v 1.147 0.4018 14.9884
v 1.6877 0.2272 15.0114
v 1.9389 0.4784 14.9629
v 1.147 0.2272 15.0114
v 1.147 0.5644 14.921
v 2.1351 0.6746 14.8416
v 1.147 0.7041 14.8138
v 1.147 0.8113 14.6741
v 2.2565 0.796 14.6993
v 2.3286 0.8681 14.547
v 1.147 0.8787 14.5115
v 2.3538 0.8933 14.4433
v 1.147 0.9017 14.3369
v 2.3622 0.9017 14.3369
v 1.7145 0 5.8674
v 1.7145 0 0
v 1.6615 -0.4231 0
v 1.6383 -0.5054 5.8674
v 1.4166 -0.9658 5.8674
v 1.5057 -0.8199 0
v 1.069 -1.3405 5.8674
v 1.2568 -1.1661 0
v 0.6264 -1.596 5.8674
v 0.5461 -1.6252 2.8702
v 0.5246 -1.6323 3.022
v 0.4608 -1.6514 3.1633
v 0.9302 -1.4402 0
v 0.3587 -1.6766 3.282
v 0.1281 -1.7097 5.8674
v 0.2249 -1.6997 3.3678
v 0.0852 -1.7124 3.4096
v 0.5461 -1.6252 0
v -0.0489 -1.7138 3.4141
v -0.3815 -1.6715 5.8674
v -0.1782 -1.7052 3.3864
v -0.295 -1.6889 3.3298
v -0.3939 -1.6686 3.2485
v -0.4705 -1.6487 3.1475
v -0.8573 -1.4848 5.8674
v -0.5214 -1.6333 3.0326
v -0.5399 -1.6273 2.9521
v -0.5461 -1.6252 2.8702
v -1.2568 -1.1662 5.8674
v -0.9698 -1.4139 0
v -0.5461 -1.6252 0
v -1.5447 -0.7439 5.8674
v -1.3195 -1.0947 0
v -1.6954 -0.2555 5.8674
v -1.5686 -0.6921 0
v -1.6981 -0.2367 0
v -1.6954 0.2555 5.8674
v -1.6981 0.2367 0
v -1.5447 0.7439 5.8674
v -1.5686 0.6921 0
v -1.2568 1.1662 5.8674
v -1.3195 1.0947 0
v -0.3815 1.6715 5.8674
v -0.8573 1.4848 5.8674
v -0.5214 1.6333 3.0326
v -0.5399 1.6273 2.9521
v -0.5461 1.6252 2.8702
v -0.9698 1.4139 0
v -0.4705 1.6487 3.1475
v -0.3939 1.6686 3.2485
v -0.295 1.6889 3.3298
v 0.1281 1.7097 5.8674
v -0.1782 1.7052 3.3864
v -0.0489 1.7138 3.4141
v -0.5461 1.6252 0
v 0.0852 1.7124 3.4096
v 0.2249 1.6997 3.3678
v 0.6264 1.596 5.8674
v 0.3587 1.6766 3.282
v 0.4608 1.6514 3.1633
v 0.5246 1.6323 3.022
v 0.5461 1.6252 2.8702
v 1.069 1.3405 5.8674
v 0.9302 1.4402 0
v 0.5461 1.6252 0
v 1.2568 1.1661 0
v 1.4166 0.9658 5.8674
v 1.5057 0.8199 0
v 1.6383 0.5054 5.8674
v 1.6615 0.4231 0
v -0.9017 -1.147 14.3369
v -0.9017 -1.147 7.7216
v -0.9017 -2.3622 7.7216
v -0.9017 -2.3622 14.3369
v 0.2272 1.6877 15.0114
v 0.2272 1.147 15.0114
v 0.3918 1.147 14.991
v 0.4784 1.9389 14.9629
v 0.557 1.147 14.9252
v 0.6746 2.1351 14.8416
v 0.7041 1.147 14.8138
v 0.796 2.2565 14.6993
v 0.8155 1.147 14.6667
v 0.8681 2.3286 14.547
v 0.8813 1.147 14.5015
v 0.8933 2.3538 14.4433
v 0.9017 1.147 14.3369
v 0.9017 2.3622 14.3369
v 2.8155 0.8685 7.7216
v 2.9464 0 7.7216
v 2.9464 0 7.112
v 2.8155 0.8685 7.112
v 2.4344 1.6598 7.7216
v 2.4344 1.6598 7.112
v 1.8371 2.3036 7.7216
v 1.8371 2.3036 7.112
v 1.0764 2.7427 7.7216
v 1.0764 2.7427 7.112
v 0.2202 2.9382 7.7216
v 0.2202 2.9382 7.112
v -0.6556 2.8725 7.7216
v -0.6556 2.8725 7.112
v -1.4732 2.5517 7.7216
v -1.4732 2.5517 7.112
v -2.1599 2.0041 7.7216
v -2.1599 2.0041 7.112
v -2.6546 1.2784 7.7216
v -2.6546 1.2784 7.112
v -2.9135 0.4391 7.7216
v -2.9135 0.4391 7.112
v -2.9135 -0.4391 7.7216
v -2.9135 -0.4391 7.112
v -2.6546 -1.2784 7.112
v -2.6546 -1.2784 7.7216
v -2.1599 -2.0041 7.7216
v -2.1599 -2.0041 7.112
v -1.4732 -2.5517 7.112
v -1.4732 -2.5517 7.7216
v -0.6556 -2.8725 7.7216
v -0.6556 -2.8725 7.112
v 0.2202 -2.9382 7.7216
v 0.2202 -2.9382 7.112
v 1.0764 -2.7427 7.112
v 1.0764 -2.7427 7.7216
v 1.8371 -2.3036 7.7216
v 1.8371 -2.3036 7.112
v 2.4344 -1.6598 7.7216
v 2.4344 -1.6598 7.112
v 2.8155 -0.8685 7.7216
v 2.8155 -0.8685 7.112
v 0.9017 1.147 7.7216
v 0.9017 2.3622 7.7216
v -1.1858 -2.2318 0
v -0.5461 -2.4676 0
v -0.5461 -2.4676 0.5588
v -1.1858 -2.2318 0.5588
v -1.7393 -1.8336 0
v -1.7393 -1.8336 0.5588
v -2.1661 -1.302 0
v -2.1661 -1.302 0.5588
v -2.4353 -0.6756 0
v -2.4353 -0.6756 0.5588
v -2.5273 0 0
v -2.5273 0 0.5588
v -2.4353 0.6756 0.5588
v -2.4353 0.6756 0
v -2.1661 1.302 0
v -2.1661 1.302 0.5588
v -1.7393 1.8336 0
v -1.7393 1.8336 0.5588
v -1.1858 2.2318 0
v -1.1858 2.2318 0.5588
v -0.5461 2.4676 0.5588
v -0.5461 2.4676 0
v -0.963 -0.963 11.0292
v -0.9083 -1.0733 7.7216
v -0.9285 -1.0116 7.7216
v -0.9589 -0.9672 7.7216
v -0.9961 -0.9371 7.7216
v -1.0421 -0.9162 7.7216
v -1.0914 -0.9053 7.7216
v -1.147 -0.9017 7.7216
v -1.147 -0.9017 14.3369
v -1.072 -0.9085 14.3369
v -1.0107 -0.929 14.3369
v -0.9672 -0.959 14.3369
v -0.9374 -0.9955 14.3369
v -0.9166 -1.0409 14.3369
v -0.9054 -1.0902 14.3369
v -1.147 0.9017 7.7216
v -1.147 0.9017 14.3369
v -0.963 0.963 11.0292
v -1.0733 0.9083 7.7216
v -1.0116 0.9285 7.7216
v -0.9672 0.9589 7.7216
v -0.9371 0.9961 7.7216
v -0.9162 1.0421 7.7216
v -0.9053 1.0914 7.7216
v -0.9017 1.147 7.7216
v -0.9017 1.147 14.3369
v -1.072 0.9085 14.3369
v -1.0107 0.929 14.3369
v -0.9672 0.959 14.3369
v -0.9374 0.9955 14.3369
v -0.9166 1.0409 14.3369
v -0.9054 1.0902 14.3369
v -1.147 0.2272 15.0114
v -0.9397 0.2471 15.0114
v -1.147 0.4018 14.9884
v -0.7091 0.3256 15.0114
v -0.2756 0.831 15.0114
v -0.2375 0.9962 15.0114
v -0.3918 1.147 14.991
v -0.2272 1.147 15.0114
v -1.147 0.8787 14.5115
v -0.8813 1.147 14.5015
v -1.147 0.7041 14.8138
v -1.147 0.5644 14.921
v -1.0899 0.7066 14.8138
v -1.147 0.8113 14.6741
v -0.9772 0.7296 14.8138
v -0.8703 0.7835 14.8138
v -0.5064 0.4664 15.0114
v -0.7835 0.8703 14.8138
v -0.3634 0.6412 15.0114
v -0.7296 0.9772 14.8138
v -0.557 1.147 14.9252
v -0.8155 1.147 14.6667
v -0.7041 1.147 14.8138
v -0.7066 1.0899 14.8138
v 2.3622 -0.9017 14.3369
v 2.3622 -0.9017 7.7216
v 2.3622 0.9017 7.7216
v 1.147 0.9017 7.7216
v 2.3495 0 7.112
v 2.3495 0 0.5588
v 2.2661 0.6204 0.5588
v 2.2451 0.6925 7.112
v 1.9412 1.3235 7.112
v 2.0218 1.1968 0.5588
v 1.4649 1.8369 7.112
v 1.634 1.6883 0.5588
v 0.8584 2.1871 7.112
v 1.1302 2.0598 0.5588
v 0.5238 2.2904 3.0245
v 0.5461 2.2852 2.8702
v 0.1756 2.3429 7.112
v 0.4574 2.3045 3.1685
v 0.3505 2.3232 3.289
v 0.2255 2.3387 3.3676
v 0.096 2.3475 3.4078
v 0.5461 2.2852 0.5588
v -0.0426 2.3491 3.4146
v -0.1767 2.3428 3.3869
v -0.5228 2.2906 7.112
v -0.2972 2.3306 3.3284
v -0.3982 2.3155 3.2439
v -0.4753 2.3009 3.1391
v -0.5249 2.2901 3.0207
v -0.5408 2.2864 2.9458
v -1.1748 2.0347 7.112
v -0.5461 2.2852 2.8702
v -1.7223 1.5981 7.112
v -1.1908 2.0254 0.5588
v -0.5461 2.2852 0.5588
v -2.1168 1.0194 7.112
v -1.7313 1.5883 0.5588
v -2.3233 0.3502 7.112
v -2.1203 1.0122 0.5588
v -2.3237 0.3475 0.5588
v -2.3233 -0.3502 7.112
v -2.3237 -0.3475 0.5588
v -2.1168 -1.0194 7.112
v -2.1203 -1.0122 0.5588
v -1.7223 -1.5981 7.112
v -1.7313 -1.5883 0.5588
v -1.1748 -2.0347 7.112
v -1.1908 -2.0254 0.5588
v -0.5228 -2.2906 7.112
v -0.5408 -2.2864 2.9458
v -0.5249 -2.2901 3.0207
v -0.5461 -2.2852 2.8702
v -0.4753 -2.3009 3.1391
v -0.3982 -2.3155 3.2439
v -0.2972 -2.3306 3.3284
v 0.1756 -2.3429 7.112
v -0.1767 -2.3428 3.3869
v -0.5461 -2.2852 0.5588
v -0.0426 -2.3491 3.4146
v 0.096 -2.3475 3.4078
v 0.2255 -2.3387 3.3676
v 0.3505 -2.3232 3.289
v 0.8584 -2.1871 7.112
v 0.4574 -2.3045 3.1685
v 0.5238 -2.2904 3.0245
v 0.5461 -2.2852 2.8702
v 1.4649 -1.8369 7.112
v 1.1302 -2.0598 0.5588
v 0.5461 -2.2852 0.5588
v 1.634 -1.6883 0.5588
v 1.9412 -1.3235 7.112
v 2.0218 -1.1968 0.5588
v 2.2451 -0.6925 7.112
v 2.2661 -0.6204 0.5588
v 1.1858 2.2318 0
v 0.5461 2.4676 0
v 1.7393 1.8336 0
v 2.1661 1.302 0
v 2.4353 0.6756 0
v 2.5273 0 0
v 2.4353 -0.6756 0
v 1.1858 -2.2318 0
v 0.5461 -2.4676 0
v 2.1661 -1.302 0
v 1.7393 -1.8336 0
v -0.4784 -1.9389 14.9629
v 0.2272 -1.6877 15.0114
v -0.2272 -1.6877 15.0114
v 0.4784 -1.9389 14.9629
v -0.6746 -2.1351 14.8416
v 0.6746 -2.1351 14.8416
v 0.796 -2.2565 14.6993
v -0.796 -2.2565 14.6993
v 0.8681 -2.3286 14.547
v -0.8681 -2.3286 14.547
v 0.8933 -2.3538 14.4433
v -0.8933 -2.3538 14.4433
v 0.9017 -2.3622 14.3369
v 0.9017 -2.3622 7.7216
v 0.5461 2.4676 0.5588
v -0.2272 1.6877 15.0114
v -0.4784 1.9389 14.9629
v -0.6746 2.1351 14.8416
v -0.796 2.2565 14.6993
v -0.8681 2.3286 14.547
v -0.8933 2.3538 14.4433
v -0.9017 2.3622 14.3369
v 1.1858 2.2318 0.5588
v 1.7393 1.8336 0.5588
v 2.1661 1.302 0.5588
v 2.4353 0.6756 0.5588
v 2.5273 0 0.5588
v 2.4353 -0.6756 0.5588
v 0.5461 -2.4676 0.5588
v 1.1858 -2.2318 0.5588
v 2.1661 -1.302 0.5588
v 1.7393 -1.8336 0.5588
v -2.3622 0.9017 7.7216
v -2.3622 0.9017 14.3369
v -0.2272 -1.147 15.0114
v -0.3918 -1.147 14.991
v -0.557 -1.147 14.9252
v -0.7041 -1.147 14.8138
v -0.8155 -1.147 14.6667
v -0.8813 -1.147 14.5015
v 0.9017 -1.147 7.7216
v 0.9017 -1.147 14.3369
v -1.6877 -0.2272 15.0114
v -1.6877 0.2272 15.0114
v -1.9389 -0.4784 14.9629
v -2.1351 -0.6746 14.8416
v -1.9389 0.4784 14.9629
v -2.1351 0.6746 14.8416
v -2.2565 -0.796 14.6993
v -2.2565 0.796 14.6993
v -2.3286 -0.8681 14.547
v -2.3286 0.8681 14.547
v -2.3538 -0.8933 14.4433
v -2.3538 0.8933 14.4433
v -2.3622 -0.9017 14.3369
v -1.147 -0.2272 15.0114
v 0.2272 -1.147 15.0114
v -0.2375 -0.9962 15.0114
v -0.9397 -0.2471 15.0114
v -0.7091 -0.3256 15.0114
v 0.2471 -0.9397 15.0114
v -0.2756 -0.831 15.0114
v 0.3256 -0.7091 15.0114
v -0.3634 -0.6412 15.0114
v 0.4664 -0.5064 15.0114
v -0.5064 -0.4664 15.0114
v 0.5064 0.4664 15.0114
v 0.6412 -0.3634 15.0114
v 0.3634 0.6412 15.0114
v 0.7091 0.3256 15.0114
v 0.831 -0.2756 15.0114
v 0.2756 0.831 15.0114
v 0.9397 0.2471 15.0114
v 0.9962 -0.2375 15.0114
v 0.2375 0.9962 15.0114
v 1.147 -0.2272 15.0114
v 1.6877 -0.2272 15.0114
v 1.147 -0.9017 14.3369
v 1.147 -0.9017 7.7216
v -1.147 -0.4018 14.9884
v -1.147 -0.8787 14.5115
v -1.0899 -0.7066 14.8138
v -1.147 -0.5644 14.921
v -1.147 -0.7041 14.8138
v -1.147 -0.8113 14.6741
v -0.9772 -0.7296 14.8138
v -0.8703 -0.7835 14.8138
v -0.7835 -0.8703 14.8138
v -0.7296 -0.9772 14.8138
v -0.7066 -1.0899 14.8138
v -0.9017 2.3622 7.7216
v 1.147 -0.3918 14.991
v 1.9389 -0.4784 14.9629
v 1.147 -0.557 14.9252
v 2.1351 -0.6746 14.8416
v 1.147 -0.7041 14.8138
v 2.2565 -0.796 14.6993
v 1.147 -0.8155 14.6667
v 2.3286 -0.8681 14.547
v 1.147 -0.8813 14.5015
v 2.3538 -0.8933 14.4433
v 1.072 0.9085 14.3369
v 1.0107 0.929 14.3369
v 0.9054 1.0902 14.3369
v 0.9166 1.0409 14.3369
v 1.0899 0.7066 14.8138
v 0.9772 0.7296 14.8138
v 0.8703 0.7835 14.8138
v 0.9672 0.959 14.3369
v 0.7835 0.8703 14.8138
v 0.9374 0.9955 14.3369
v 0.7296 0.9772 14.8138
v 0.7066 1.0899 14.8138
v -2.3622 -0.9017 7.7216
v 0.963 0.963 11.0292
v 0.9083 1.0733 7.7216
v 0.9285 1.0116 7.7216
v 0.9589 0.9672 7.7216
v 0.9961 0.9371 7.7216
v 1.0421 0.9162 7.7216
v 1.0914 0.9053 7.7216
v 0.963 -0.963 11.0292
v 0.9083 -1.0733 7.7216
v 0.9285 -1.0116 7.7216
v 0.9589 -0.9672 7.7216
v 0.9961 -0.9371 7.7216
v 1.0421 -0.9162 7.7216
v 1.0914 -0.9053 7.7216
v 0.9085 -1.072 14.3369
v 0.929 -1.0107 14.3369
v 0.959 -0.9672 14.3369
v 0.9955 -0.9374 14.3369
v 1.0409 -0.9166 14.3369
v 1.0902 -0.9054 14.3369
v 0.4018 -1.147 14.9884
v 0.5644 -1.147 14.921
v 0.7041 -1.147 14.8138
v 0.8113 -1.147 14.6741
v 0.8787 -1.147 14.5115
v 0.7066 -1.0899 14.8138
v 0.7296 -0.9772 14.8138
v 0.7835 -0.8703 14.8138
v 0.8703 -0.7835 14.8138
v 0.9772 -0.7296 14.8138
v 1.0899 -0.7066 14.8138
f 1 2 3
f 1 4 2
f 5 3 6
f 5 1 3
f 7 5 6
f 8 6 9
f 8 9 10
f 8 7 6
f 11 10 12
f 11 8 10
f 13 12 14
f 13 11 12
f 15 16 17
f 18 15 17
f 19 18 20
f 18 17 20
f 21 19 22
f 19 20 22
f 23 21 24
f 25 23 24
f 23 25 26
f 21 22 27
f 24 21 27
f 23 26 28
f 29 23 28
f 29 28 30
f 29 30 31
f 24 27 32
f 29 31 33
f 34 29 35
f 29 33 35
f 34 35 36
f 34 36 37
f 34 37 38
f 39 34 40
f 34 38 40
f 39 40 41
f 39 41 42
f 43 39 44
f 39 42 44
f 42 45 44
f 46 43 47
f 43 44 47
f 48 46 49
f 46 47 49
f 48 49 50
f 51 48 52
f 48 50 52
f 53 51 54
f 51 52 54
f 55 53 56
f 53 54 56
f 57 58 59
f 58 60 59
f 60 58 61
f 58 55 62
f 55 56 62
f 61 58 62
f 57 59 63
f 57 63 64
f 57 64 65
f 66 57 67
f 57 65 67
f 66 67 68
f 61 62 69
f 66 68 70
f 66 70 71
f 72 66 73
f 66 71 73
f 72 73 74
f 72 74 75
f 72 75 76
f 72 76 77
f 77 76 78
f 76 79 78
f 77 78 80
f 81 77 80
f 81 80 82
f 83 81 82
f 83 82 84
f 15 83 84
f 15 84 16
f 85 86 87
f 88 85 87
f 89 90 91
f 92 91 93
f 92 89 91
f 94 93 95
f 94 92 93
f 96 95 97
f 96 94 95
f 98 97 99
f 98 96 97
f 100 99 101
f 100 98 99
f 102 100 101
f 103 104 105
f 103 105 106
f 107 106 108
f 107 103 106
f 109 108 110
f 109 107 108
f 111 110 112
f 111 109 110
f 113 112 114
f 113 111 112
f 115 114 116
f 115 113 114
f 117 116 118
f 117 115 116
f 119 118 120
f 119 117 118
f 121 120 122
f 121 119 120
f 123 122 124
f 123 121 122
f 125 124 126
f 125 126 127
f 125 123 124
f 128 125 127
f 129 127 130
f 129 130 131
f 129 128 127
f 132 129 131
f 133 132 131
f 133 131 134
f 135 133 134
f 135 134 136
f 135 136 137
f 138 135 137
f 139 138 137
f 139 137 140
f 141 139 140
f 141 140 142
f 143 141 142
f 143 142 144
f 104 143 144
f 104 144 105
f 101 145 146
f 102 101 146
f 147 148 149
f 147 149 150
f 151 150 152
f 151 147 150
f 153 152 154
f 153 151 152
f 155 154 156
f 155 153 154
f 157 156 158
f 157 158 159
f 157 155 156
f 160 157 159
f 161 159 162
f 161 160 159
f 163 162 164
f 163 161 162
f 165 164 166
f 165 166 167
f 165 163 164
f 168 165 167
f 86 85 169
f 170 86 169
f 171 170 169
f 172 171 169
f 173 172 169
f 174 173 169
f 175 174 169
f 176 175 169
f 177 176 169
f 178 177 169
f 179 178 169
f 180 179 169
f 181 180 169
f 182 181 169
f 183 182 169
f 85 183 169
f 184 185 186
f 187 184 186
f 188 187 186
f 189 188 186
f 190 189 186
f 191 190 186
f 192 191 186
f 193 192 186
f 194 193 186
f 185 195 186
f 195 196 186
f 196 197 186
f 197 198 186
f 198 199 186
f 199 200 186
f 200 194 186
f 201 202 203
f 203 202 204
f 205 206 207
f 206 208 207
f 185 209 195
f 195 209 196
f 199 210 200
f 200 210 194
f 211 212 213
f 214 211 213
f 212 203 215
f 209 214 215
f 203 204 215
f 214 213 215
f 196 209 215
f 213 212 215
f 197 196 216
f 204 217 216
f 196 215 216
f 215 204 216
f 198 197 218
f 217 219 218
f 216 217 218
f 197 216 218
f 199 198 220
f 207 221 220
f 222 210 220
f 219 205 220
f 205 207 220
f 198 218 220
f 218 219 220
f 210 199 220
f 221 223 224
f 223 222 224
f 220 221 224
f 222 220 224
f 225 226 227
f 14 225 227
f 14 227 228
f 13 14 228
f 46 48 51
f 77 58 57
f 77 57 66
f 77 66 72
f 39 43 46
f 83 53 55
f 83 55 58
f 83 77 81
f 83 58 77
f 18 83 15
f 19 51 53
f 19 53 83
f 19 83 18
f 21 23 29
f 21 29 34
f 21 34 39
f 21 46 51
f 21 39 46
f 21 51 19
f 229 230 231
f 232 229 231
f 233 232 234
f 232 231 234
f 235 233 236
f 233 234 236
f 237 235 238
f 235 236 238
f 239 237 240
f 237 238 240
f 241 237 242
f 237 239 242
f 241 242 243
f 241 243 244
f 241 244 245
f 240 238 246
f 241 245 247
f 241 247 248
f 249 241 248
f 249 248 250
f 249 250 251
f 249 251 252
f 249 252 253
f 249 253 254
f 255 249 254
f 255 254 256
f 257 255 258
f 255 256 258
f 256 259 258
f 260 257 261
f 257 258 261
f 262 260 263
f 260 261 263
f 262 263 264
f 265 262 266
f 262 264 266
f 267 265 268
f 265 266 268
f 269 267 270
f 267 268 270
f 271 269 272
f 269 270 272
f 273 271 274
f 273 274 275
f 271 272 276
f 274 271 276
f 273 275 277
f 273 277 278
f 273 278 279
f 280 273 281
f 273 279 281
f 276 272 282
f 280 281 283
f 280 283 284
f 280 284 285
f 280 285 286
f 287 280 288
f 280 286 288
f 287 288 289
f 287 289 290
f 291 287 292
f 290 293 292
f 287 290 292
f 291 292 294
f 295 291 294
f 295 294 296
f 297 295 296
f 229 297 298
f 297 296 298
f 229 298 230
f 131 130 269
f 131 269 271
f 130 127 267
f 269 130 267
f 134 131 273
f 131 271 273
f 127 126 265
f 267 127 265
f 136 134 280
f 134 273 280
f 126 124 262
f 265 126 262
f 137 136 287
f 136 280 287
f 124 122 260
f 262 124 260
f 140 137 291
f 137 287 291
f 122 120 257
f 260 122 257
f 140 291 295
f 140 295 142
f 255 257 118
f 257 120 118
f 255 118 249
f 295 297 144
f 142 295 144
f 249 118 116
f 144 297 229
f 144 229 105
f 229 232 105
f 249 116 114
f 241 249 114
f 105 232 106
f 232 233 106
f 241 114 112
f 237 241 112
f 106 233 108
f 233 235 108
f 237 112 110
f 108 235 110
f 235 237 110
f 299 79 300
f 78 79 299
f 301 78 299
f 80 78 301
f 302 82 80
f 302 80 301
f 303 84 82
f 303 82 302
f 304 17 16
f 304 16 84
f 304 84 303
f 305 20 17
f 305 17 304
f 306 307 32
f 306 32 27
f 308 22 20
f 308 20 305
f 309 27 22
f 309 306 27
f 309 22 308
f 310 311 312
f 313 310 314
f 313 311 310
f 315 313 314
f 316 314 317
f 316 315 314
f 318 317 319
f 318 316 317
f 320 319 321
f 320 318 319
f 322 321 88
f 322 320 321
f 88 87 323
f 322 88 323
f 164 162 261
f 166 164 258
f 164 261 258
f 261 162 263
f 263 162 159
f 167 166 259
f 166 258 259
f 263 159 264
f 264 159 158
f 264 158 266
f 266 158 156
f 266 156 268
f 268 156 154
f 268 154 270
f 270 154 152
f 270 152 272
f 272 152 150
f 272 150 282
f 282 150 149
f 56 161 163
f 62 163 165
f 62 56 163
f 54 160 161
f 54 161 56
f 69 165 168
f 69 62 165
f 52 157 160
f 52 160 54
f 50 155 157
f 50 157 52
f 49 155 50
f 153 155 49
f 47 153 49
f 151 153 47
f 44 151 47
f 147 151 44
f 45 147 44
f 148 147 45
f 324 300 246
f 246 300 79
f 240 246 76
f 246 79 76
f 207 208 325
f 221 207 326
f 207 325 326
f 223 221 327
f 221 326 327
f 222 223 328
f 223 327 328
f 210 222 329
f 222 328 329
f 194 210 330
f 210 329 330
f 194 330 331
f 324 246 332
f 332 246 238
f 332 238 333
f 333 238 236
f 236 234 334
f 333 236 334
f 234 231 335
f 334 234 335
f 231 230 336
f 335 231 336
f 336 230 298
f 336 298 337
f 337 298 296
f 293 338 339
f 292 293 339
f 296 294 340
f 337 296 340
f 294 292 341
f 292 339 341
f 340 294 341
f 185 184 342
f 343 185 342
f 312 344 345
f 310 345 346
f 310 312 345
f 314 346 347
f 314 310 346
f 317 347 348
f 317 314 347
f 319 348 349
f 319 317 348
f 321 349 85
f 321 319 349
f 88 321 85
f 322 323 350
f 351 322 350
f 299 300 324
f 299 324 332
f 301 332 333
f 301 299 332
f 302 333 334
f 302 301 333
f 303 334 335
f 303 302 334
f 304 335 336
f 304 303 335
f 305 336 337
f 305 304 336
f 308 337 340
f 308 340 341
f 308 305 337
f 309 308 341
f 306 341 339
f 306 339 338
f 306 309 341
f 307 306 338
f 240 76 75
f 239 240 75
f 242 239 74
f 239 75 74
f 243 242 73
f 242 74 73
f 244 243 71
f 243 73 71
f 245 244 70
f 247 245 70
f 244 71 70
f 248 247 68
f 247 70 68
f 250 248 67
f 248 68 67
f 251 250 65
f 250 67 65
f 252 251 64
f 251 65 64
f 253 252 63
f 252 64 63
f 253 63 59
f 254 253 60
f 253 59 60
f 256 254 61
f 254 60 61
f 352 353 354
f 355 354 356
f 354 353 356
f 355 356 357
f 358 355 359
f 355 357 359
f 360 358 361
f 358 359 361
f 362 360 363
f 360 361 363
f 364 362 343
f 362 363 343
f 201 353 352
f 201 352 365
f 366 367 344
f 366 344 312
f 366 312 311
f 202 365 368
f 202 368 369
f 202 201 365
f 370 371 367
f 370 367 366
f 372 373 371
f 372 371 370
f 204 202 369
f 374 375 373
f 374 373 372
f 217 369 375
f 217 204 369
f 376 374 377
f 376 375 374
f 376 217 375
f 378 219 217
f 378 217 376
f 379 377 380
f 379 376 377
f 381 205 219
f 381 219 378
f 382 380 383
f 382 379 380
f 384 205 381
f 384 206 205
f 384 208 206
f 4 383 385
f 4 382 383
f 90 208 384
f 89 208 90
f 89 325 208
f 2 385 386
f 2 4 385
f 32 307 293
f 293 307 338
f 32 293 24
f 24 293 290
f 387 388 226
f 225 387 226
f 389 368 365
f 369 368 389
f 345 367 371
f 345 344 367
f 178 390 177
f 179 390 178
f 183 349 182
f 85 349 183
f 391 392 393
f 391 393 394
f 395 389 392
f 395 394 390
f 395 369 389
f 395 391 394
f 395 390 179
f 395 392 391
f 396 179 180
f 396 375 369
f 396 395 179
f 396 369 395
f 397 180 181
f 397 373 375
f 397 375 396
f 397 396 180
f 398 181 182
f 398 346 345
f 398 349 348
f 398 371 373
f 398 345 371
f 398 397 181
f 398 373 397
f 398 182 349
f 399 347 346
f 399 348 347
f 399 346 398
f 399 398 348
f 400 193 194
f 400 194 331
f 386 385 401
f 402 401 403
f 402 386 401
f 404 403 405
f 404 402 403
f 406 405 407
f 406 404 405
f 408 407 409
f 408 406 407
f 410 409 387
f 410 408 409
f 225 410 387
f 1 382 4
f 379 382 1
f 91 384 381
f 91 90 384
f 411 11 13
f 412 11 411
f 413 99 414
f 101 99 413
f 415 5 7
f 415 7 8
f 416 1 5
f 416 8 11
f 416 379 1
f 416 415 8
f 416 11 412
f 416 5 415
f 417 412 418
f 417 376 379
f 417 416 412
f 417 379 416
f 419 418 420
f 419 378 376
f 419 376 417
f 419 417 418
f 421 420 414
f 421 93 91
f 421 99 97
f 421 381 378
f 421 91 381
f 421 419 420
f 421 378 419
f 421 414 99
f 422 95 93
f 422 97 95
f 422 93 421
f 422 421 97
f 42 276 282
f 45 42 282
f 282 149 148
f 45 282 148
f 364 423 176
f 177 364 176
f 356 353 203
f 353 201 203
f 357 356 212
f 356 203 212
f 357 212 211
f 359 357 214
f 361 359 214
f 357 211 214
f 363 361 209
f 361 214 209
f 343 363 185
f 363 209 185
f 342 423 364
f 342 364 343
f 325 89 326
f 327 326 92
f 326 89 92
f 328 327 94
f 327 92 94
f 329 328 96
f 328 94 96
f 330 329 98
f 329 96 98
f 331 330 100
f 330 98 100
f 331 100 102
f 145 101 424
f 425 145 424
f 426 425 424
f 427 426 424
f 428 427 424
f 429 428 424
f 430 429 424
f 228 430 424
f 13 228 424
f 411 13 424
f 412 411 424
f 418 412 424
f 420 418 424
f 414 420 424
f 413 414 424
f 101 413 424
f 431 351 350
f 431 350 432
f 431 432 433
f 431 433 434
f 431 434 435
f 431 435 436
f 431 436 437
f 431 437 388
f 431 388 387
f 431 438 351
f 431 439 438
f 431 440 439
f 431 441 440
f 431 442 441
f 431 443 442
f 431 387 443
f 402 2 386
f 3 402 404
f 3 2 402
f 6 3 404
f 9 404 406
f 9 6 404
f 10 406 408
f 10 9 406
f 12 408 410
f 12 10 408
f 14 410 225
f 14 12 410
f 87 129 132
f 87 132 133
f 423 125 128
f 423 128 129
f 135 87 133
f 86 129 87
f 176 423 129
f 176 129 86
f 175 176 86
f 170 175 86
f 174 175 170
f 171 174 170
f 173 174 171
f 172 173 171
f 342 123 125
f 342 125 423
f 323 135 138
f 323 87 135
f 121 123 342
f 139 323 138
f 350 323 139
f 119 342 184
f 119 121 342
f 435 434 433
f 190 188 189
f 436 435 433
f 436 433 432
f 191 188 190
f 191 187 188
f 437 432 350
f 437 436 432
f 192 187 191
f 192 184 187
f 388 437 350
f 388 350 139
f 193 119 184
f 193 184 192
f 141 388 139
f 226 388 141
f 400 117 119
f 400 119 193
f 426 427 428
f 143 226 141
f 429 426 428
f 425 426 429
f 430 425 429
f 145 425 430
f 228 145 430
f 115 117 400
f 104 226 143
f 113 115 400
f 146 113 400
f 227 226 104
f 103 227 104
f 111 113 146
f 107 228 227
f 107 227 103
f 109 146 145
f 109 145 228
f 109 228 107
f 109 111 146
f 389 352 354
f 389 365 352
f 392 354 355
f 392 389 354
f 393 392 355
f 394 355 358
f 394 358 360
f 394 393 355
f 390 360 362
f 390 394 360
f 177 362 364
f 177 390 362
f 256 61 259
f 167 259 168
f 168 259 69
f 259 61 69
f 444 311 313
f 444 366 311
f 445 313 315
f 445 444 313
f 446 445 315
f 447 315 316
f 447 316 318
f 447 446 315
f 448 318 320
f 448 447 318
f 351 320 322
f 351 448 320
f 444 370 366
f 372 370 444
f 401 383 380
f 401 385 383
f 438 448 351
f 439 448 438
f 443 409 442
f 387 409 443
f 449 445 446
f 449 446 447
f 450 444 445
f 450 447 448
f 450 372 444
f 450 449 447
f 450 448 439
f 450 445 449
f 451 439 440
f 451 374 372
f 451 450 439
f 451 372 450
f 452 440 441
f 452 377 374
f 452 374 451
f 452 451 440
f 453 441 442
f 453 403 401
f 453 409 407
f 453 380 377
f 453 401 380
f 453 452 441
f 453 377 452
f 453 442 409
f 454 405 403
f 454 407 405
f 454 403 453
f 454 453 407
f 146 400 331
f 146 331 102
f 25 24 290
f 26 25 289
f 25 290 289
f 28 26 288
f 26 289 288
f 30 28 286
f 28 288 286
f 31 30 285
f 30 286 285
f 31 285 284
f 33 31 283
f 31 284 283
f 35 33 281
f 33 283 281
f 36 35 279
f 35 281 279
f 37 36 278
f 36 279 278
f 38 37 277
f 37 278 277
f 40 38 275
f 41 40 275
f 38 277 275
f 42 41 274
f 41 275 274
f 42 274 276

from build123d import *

# Parameters (mm, degrees)
F0_R         = 2.3495
F1_DEPTH     = 15.6718
F3_R         = 2.5273
F4_DEPTH     = 0.5588
F5_DEPTH     = 12.7
F6_R         = 2.9464
F7_DEPTH     = 8.5598
F8_R         = 12.7
F9_DEPTH     = 7.9502
F10_W        = 1.4605
F10_H        = 1.8034
F10_W_2      = 1.8034
F10_H_2      = 1.4605
F11_DEPTH    = 7.2898
F12_T1_DEPTH = 7.9030102448
F13_R        = 0.6745312693
F14_R        = 1.7145
F15_DEPTH    = 5.8674


# Not quite as in the source:
# - a fillet or chamfer that OpenCascade refuses, or shapes differently, is made with other operations: its cross-section is extruded or revolved along the edge and cut away or added


with BuildPart() as f1:
    # F0 (on Top) → F1 (new body)
    with BuildSketch(Plane.XY):
        Circle(F0_R)
    extrude(amount=F1_DEPTH)

    # F3 (on face) → F4 (join)
    with BuildSketch(Plane(origin=(0, 0, 0), x_dir=(1, 0, 0), z_dir=(0, 0, -1))):
        Circle(F3_R)
    extrude(amount=-F4_DEPTH)

    # F2 (on Front) → F5 (cut, symmetric)
    with BuildSketch(Plane.XZ):
        with BuildLine():
            Line((-0.5461, -2.8702), (0.5461, -2.8702))
            Line((0.5461, -2.8702), (0.5461, 2.8702))
            ThreePointArc((0.5461, 2.8702), (0, 2.3241), (-0.5461, 2.8702))
            Line((-0.5461, 2.8702), (-0.5461, -2.8702))
        make_face()
        with BuildLine():
            ThreePointArc((-0.5461, 2.8702), (0, 2.3241), (0.5461, 2.8702))
            Line((0.5461, 2.8702), (-0.5461, 2.8702))
        make_face()
        with BuildLine():
            Line((-0.5461, 2.8702), (0.5461, 2.8702))
            ThreePointArc((0.5461, 2.8702), (0, 3.4163), (-0.5461, 2.8702))
        make_face()
    extrude(amount=F5_DEPTH, both=True, mode=Mode.SUBTRACT)

    # F6 (on face) → F7 (join)
    with BuildSketch(Plane.XY.offset(15.6718)):
        Circle(F6_R)
    extrude(amount=-F7_DEPTH)

    # F8 (on face) → F9 (cut)
    with BuildSketch(Plane.XY.offset(15.6718)):
        Circle(F8_R)
    extrude(amount=-F9_DEPTH, mode=Mode.SUBTRACT)

    # F10 (on face) → F11 (join)
    with BuildSketch(Plane.XY.offset(7.7216)):
        with Locations((1.63195, 0)):
            Rectangle(F10_W, F10_H)
        with Locations((0, -1.63195)):
            Rectangle(F10_W_2, F10_H_2)
        Rectangle(F10_W_2, F10_H)
        with Locations((-1.63195, 0)):
            Rectangle(F10_W, F10_H)
        with Locations((0, 1.63195)):
            Rectangle(F10_W_2, F10_H_2)
    extrude(amount=F11_DEPTH)

    # F12: fillet of radius 0.2452840979 on 4 edges, made by hand

    # F12_s2 → F12_t1 (join)
    with BuildSketch(Plane.XY.offset(7.1083897552)):
        with BuildLine():
            add(Edge.make_bspline(
                [(-1.1469840979, -0.9017), (-0.9017, -0.9017), (-0.9017, -1.1469840979)],
                knots=[0, 0, 0, 1, 1, 1], degree=2, weights=[1, 1, 1]))
            Line((-0.9017, -1.1469840979), (-0.9017, -0.9017))
            Line((-0.9017, -0.9017), (-1.1469840979, -0.9017))
        make_face()
        with BuildLine():
            add(Edge.make_bspline(
                [(1.1469840979, 0.9017), (0.9017, 0.9017), (0.9017, 1.1469840979)],
                knots=[0, 0, 0, 1, 1, 1], degree=2, weights=[1, 1, 1]))
            Line((0.9017, 1.1469840979), (0.9017, 0.9017))
            Line((0.9017, 0.9017), (1.1469840979, 0.9017))
        make_face()
        with BuildLine():
            add(Edge.make_bspline(
                [(1.1469840979, -0.9017), (0.9017, -0.9017), (0.9017, -1.1469840979)],
                knots=[0, 0, 0, 1, 1, 1], degree=2, weights=[1, 1, 1]))
            Line((0.9017, -1.1469840979), (0.9017, -0.9017))
            Line((0.9017, -0.9017), (1.1469840979, -0.9017))
        make_face()
        with BuildLine():
            add(Edge.make_bspline(
                [(-0.9017, 1.1469840979), (-0.9017, 0.9017), (-1.1469840979, 0.9017)],
                knots=[0, 0, 0, 1, 1, 1], degree=2, weights=[1, 1, 1]))
            Line((-1.1469840979, 0.9017), (-0.9017, 0.9017))
            Line((-0.9017, 0.9017), (-0.9017, 1.1469840979))
        make_face()
    extrude(amount=F12_T1_DEPTH)

    # F13
    f13_edges = [f1.edges().sort_by_distance(p)[0] for p in [
        (1.754592, -0.9017, 15.0114),
        (2.3622, 0, 15.0114),
        (1.754592, 0.9017, 15.0114),
        (0.963022, 0.96302, 15.0114),
        (0.9017, 1.754592, 15.0114),
        (0, 2.3622, 15.0114),
        (-0.9017, 1.754592, 15.0114),
        (-0.96302, 0.963022, 15.0114),
        (-1.754592, 0.9017, 15.0114),
        (-2.3622, 0, 15.0114),
        (-1.754592, -0.9017, 15.0114),
        (-0.963022, -0.96302, 15.0114),
        (-0.9017, -1.754592, 15.0114),
        (0, -2.3622, 15.0114),
        (0.9017, -1.754592, 15.0114),
        (0.963022, -0.96302, 15.0114),
    ]]
    fillet(f13_edges, radius=F13_R)

    # F14 (on face) → F15 (cut)
    with BuildSketch(Plane(origin=(0, 0, 0), x_dir=(1, 0, 0), z_dir=(0, 0, -1))):
        Circle(F14_R)
    extrude(amount=-F15_DEPTH, mode=Mode.SUBTRACT)


solid = f1.part
